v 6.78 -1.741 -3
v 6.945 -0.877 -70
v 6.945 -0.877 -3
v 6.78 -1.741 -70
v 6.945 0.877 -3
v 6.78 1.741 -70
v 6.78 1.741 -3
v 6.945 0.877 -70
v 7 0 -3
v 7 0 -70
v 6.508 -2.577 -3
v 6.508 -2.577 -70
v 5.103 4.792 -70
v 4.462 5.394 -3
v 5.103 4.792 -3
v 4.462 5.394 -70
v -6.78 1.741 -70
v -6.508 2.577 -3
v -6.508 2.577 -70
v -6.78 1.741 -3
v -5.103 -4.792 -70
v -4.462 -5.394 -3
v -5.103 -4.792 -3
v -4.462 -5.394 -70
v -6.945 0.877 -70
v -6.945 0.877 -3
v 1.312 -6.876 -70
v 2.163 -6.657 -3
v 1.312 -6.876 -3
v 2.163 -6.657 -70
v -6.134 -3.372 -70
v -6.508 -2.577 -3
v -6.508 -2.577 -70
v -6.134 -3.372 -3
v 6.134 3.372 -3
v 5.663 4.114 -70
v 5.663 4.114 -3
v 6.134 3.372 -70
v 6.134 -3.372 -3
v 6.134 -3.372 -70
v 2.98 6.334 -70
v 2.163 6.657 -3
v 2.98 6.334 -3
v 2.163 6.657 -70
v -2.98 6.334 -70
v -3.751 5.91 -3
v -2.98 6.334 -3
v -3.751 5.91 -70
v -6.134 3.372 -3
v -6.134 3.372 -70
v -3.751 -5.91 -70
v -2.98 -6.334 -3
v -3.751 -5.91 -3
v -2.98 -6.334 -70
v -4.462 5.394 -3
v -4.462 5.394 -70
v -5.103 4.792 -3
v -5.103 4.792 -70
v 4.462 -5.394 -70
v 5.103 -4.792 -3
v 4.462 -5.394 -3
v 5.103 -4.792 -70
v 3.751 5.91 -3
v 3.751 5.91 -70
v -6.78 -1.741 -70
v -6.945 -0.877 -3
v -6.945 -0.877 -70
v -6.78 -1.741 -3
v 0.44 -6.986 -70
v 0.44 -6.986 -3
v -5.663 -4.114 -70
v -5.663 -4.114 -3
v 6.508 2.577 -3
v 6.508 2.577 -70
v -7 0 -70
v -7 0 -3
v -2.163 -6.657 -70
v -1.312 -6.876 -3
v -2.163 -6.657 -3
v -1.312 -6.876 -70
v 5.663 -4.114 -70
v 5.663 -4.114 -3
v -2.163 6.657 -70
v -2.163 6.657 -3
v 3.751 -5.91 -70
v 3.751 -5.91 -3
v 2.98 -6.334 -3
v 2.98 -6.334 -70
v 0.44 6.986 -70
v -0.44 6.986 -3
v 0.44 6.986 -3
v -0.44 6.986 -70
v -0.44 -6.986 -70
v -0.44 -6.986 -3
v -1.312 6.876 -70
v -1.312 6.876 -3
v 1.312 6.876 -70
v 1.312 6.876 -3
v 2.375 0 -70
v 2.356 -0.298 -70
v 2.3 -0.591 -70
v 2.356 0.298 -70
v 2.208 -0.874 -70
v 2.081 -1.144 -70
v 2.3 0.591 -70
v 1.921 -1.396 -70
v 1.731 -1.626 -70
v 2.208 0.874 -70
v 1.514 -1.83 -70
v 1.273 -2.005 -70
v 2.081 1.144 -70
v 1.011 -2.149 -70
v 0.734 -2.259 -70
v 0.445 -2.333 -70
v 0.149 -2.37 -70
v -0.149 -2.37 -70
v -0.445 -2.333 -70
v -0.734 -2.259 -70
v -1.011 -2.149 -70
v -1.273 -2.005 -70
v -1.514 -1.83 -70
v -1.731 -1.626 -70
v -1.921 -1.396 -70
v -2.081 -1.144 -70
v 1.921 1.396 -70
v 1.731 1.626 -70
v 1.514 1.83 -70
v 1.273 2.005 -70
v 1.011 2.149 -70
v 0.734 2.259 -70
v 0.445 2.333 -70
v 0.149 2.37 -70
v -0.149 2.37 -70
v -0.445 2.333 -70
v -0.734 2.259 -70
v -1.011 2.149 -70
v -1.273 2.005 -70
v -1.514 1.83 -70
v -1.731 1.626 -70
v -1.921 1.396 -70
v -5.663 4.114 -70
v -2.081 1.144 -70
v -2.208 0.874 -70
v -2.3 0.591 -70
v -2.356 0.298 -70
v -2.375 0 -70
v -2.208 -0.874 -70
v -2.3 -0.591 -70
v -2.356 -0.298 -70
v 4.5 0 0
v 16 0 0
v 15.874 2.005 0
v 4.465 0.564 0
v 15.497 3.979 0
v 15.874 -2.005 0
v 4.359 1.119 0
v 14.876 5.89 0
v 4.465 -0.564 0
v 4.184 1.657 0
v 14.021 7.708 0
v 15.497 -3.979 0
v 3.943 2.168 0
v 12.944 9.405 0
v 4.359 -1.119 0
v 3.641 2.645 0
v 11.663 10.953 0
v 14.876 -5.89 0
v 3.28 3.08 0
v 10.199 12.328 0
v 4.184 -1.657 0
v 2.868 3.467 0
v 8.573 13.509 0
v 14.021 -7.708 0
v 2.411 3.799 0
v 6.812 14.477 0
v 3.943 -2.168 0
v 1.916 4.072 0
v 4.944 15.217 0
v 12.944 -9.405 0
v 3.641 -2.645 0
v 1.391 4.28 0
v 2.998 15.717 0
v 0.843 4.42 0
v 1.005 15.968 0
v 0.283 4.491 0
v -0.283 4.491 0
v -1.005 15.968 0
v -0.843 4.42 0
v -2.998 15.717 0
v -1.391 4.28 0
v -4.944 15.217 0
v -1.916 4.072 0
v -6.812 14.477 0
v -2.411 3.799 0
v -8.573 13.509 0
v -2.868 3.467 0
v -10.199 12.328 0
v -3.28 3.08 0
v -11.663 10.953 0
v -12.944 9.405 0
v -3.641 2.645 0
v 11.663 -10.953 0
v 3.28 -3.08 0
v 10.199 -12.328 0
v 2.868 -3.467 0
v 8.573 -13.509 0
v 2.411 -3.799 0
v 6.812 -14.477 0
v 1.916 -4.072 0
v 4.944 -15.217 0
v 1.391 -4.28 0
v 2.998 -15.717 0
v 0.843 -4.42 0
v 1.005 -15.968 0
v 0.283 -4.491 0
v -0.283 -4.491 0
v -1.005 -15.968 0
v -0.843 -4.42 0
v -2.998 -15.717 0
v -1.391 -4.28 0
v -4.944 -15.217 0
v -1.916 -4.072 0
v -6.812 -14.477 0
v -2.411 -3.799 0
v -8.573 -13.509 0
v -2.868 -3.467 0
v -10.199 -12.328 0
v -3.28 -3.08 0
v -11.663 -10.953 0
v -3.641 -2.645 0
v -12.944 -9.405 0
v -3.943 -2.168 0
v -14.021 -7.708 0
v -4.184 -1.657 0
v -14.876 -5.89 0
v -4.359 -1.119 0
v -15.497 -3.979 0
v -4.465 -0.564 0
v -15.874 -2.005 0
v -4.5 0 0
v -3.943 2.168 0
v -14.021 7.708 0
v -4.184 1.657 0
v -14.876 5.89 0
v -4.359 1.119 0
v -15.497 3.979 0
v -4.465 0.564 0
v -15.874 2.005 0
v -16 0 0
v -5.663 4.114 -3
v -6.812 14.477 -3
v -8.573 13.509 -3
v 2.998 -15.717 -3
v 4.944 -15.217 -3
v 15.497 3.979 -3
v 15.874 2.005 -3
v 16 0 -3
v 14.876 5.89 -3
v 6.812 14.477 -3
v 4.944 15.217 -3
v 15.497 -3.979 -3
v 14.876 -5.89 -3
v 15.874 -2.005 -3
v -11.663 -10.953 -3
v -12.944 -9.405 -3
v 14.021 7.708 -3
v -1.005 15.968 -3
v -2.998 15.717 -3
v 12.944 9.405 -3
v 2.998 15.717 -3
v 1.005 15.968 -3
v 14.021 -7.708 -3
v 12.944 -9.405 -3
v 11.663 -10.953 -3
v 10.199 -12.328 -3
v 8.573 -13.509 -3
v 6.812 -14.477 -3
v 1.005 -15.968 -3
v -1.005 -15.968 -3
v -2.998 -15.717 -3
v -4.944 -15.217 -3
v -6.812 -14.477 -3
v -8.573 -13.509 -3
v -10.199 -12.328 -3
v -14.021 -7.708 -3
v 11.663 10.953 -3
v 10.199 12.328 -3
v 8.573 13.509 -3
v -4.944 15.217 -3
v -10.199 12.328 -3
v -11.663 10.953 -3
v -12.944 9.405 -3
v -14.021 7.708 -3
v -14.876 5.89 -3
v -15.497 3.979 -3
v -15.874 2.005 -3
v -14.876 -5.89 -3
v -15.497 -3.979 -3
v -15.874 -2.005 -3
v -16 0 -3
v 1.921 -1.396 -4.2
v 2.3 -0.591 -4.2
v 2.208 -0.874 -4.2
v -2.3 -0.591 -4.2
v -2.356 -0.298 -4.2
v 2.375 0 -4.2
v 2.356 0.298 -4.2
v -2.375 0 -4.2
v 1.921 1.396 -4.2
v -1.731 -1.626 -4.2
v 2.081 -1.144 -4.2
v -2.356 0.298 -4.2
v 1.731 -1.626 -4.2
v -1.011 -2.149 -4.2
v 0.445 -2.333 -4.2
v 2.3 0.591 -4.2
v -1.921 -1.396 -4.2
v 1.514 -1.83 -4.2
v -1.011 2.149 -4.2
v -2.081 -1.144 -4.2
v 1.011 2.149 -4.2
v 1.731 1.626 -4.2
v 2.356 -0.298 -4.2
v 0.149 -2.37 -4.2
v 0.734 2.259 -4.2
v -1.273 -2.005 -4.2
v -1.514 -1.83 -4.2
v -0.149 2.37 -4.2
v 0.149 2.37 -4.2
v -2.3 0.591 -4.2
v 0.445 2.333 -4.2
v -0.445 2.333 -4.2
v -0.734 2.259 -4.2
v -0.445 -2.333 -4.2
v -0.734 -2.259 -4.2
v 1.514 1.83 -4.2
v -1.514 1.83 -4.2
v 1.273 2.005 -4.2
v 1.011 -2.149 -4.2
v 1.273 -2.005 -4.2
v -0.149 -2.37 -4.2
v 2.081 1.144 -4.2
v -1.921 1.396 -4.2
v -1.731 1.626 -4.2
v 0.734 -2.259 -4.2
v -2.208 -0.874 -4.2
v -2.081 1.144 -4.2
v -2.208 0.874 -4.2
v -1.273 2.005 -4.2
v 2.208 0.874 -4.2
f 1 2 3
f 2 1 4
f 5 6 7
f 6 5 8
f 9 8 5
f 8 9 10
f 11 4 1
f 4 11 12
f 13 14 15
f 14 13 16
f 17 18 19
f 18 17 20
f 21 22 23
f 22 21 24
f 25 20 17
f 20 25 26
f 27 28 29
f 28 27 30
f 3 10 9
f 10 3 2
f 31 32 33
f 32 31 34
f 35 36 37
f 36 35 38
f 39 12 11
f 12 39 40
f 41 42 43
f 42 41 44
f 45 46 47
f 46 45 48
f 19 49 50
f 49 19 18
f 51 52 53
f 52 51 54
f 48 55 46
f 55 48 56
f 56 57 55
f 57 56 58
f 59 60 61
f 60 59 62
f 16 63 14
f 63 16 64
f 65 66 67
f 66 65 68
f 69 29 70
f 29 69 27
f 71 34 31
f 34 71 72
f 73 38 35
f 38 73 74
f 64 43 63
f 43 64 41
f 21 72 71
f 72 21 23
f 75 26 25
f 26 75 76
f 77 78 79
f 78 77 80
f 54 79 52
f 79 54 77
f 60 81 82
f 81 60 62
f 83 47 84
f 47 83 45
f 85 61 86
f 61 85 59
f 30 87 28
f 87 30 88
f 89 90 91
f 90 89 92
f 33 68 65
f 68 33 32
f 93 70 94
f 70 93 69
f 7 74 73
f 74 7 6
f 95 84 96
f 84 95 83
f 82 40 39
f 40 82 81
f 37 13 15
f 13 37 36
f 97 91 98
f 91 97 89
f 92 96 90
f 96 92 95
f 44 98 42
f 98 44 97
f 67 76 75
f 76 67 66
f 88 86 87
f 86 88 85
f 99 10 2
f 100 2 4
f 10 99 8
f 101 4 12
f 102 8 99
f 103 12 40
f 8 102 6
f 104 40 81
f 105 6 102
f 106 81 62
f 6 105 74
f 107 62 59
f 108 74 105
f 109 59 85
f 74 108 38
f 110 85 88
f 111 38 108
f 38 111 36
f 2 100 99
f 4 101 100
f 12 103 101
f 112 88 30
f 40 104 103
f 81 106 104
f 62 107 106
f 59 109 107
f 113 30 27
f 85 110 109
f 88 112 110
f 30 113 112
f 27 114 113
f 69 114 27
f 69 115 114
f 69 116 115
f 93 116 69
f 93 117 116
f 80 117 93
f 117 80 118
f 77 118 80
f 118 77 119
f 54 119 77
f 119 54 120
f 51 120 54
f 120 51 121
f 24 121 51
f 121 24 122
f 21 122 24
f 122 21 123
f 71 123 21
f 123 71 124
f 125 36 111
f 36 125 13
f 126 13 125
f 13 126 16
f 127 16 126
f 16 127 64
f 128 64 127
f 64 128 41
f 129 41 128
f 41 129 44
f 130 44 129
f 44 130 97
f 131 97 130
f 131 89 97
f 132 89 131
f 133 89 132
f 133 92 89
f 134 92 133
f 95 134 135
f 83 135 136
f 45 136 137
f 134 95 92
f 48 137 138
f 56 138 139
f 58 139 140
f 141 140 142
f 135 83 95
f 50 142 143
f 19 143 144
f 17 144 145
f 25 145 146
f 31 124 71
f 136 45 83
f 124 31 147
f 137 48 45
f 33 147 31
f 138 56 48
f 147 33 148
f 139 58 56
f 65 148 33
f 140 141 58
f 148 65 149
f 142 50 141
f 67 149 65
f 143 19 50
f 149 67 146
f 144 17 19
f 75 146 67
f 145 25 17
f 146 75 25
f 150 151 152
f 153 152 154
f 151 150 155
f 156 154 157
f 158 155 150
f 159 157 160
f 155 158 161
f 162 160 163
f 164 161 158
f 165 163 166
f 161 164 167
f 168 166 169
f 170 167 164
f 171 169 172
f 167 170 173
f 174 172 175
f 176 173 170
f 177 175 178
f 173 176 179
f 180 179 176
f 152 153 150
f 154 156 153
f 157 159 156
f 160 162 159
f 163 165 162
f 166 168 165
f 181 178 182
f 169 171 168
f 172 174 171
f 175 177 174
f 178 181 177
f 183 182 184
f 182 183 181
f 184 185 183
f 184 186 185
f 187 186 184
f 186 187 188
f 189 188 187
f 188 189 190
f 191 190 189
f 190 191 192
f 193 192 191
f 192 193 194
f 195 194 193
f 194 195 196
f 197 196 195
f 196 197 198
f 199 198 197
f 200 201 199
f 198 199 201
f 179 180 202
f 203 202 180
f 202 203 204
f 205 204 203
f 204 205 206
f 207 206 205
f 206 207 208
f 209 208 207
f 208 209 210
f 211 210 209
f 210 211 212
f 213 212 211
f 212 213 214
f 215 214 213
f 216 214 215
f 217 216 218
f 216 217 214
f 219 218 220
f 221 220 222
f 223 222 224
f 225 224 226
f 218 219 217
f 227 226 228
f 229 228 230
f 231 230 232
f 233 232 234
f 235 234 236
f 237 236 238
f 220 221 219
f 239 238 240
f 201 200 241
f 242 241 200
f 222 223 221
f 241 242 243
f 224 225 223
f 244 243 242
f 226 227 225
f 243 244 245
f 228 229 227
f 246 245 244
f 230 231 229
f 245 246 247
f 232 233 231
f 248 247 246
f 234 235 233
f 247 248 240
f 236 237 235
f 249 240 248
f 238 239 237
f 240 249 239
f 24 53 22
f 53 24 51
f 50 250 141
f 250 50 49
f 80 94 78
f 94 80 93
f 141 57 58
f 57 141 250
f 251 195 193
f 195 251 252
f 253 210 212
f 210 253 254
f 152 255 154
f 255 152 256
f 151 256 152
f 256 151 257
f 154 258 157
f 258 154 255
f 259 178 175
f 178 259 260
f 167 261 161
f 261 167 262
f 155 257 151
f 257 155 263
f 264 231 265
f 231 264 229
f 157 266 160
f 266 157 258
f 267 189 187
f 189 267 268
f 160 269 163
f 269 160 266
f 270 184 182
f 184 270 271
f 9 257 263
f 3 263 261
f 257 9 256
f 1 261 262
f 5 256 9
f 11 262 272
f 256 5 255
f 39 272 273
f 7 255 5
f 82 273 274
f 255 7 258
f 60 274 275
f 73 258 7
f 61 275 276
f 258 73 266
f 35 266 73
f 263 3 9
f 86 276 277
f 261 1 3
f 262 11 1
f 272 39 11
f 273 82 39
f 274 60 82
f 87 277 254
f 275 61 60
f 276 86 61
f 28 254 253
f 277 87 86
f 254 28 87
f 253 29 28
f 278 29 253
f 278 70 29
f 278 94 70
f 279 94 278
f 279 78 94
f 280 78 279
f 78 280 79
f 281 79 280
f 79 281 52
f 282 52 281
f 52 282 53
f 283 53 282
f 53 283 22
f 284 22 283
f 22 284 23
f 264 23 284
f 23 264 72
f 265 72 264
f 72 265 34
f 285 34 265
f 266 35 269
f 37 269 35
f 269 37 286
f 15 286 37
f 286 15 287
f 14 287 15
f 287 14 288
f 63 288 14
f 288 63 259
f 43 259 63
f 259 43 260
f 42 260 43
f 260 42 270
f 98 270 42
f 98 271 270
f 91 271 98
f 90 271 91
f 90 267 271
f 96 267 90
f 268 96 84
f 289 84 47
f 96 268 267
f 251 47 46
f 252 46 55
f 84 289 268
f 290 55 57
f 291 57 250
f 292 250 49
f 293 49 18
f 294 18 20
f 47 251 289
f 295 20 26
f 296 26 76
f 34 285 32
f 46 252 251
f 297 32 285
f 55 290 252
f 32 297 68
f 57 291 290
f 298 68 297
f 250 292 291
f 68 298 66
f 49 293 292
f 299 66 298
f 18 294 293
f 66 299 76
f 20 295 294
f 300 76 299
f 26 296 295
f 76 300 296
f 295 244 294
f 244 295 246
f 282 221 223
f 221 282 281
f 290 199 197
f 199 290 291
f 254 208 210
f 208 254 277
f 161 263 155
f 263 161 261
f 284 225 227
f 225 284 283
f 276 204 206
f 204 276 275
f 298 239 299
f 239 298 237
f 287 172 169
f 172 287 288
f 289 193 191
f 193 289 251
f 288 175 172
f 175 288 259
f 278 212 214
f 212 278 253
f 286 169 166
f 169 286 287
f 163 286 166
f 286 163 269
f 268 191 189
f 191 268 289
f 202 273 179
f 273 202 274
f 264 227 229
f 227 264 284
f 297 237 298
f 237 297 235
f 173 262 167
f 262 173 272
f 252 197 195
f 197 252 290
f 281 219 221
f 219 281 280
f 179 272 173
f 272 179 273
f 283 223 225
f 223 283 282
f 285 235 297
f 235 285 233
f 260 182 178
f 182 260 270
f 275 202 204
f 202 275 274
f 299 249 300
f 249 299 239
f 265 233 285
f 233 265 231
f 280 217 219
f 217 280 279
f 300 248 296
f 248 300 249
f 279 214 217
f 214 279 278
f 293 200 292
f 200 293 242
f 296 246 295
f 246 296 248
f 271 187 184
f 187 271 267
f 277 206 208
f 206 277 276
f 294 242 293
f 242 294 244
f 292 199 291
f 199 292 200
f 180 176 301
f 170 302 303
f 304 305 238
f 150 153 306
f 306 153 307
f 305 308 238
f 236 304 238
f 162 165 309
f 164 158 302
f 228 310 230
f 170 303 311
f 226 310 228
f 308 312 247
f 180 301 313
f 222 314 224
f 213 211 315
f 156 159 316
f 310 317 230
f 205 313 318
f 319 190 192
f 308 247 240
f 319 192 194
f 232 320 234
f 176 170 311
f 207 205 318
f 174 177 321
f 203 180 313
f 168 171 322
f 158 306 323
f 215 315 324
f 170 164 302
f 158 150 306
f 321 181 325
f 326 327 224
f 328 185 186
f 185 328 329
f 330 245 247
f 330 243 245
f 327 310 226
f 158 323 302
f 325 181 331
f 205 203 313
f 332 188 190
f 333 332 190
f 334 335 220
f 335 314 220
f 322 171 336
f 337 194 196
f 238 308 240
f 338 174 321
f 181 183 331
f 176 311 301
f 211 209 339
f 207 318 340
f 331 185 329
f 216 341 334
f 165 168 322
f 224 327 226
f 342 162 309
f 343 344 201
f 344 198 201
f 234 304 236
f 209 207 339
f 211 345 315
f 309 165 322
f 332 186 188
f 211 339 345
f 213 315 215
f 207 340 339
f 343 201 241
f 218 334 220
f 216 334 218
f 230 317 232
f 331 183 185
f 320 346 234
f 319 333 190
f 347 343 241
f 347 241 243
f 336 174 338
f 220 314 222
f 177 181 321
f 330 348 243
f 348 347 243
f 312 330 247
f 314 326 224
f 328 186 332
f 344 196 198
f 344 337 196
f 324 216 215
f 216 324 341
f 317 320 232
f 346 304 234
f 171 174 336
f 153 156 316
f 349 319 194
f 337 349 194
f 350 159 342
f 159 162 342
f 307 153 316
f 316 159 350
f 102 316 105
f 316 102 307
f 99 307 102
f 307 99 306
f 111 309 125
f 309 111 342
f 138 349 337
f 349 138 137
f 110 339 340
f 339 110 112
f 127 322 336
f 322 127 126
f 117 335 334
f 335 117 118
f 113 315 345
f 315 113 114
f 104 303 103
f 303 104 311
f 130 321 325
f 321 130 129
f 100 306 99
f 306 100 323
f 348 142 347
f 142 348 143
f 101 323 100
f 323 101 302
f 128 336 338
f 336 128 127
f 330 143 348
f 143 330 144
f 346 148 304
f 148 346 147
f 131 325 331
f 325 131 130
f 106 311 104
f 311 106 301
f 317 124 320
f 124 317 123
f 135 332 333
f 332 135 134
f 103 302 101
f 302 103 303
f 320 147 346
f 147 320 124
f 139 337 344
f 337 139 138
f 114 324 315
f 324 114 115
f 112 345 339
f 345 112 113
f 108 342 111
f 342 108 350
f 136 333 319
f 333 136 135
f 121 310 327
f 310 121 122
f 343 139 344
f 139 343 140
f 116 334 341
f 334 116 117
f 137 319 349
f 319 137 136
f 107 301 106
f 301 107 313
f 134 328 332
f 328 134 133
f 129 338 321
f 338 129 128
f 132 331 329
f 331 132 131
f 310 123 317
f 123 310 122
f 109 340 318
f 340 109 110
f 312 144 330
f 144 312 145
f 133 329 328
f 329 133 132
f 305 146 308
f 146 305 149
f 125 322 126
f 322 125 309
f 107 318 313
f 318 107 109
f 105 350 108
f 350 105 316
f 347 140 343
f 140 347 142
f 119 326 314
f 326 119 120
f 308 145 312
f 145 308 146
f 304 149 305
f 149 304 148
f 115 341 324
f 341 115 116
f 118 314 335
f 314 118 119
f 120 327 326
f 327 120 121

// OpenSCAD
$fn = 50;


difference() {
	union() {
		translate(v = [0, 0, -70.0000000000]) {
			cylinder(h = 70, r = 7.0000000000);
		}
		translate(v = [0, 0, -3.0000000000]) {
			cylinder(h = 3, r = 16.0000000000);
		}
	}
	union() {
		translate(v = [0, 0, 0]) {
			rotate(a = [0, 0, 0]) {
				difference() {
					union() {
						#translate(v = [0, 0, -70.0000000000]) {
							cylinder(h = 70, r = 2.2500000000);
						}
						#translate(v = [0, 0, -4.2000000000]) {
							cylinder(h = 4.2000000000, r = 7.0000000000, r1 = 2.3750000000, r2 = 4.5000000000);
						}
						#translate(v = [0, 0, -70.0000000000]) {
							cylinder(h = 70, r = 2.3750000000);
						}
						#translate(v = [0, 0, -70.0000000000]) {
							cylinder(h = 70, r = 2.2500000000);
						}
					}
					union();
				}
			}
		}
	}
}
